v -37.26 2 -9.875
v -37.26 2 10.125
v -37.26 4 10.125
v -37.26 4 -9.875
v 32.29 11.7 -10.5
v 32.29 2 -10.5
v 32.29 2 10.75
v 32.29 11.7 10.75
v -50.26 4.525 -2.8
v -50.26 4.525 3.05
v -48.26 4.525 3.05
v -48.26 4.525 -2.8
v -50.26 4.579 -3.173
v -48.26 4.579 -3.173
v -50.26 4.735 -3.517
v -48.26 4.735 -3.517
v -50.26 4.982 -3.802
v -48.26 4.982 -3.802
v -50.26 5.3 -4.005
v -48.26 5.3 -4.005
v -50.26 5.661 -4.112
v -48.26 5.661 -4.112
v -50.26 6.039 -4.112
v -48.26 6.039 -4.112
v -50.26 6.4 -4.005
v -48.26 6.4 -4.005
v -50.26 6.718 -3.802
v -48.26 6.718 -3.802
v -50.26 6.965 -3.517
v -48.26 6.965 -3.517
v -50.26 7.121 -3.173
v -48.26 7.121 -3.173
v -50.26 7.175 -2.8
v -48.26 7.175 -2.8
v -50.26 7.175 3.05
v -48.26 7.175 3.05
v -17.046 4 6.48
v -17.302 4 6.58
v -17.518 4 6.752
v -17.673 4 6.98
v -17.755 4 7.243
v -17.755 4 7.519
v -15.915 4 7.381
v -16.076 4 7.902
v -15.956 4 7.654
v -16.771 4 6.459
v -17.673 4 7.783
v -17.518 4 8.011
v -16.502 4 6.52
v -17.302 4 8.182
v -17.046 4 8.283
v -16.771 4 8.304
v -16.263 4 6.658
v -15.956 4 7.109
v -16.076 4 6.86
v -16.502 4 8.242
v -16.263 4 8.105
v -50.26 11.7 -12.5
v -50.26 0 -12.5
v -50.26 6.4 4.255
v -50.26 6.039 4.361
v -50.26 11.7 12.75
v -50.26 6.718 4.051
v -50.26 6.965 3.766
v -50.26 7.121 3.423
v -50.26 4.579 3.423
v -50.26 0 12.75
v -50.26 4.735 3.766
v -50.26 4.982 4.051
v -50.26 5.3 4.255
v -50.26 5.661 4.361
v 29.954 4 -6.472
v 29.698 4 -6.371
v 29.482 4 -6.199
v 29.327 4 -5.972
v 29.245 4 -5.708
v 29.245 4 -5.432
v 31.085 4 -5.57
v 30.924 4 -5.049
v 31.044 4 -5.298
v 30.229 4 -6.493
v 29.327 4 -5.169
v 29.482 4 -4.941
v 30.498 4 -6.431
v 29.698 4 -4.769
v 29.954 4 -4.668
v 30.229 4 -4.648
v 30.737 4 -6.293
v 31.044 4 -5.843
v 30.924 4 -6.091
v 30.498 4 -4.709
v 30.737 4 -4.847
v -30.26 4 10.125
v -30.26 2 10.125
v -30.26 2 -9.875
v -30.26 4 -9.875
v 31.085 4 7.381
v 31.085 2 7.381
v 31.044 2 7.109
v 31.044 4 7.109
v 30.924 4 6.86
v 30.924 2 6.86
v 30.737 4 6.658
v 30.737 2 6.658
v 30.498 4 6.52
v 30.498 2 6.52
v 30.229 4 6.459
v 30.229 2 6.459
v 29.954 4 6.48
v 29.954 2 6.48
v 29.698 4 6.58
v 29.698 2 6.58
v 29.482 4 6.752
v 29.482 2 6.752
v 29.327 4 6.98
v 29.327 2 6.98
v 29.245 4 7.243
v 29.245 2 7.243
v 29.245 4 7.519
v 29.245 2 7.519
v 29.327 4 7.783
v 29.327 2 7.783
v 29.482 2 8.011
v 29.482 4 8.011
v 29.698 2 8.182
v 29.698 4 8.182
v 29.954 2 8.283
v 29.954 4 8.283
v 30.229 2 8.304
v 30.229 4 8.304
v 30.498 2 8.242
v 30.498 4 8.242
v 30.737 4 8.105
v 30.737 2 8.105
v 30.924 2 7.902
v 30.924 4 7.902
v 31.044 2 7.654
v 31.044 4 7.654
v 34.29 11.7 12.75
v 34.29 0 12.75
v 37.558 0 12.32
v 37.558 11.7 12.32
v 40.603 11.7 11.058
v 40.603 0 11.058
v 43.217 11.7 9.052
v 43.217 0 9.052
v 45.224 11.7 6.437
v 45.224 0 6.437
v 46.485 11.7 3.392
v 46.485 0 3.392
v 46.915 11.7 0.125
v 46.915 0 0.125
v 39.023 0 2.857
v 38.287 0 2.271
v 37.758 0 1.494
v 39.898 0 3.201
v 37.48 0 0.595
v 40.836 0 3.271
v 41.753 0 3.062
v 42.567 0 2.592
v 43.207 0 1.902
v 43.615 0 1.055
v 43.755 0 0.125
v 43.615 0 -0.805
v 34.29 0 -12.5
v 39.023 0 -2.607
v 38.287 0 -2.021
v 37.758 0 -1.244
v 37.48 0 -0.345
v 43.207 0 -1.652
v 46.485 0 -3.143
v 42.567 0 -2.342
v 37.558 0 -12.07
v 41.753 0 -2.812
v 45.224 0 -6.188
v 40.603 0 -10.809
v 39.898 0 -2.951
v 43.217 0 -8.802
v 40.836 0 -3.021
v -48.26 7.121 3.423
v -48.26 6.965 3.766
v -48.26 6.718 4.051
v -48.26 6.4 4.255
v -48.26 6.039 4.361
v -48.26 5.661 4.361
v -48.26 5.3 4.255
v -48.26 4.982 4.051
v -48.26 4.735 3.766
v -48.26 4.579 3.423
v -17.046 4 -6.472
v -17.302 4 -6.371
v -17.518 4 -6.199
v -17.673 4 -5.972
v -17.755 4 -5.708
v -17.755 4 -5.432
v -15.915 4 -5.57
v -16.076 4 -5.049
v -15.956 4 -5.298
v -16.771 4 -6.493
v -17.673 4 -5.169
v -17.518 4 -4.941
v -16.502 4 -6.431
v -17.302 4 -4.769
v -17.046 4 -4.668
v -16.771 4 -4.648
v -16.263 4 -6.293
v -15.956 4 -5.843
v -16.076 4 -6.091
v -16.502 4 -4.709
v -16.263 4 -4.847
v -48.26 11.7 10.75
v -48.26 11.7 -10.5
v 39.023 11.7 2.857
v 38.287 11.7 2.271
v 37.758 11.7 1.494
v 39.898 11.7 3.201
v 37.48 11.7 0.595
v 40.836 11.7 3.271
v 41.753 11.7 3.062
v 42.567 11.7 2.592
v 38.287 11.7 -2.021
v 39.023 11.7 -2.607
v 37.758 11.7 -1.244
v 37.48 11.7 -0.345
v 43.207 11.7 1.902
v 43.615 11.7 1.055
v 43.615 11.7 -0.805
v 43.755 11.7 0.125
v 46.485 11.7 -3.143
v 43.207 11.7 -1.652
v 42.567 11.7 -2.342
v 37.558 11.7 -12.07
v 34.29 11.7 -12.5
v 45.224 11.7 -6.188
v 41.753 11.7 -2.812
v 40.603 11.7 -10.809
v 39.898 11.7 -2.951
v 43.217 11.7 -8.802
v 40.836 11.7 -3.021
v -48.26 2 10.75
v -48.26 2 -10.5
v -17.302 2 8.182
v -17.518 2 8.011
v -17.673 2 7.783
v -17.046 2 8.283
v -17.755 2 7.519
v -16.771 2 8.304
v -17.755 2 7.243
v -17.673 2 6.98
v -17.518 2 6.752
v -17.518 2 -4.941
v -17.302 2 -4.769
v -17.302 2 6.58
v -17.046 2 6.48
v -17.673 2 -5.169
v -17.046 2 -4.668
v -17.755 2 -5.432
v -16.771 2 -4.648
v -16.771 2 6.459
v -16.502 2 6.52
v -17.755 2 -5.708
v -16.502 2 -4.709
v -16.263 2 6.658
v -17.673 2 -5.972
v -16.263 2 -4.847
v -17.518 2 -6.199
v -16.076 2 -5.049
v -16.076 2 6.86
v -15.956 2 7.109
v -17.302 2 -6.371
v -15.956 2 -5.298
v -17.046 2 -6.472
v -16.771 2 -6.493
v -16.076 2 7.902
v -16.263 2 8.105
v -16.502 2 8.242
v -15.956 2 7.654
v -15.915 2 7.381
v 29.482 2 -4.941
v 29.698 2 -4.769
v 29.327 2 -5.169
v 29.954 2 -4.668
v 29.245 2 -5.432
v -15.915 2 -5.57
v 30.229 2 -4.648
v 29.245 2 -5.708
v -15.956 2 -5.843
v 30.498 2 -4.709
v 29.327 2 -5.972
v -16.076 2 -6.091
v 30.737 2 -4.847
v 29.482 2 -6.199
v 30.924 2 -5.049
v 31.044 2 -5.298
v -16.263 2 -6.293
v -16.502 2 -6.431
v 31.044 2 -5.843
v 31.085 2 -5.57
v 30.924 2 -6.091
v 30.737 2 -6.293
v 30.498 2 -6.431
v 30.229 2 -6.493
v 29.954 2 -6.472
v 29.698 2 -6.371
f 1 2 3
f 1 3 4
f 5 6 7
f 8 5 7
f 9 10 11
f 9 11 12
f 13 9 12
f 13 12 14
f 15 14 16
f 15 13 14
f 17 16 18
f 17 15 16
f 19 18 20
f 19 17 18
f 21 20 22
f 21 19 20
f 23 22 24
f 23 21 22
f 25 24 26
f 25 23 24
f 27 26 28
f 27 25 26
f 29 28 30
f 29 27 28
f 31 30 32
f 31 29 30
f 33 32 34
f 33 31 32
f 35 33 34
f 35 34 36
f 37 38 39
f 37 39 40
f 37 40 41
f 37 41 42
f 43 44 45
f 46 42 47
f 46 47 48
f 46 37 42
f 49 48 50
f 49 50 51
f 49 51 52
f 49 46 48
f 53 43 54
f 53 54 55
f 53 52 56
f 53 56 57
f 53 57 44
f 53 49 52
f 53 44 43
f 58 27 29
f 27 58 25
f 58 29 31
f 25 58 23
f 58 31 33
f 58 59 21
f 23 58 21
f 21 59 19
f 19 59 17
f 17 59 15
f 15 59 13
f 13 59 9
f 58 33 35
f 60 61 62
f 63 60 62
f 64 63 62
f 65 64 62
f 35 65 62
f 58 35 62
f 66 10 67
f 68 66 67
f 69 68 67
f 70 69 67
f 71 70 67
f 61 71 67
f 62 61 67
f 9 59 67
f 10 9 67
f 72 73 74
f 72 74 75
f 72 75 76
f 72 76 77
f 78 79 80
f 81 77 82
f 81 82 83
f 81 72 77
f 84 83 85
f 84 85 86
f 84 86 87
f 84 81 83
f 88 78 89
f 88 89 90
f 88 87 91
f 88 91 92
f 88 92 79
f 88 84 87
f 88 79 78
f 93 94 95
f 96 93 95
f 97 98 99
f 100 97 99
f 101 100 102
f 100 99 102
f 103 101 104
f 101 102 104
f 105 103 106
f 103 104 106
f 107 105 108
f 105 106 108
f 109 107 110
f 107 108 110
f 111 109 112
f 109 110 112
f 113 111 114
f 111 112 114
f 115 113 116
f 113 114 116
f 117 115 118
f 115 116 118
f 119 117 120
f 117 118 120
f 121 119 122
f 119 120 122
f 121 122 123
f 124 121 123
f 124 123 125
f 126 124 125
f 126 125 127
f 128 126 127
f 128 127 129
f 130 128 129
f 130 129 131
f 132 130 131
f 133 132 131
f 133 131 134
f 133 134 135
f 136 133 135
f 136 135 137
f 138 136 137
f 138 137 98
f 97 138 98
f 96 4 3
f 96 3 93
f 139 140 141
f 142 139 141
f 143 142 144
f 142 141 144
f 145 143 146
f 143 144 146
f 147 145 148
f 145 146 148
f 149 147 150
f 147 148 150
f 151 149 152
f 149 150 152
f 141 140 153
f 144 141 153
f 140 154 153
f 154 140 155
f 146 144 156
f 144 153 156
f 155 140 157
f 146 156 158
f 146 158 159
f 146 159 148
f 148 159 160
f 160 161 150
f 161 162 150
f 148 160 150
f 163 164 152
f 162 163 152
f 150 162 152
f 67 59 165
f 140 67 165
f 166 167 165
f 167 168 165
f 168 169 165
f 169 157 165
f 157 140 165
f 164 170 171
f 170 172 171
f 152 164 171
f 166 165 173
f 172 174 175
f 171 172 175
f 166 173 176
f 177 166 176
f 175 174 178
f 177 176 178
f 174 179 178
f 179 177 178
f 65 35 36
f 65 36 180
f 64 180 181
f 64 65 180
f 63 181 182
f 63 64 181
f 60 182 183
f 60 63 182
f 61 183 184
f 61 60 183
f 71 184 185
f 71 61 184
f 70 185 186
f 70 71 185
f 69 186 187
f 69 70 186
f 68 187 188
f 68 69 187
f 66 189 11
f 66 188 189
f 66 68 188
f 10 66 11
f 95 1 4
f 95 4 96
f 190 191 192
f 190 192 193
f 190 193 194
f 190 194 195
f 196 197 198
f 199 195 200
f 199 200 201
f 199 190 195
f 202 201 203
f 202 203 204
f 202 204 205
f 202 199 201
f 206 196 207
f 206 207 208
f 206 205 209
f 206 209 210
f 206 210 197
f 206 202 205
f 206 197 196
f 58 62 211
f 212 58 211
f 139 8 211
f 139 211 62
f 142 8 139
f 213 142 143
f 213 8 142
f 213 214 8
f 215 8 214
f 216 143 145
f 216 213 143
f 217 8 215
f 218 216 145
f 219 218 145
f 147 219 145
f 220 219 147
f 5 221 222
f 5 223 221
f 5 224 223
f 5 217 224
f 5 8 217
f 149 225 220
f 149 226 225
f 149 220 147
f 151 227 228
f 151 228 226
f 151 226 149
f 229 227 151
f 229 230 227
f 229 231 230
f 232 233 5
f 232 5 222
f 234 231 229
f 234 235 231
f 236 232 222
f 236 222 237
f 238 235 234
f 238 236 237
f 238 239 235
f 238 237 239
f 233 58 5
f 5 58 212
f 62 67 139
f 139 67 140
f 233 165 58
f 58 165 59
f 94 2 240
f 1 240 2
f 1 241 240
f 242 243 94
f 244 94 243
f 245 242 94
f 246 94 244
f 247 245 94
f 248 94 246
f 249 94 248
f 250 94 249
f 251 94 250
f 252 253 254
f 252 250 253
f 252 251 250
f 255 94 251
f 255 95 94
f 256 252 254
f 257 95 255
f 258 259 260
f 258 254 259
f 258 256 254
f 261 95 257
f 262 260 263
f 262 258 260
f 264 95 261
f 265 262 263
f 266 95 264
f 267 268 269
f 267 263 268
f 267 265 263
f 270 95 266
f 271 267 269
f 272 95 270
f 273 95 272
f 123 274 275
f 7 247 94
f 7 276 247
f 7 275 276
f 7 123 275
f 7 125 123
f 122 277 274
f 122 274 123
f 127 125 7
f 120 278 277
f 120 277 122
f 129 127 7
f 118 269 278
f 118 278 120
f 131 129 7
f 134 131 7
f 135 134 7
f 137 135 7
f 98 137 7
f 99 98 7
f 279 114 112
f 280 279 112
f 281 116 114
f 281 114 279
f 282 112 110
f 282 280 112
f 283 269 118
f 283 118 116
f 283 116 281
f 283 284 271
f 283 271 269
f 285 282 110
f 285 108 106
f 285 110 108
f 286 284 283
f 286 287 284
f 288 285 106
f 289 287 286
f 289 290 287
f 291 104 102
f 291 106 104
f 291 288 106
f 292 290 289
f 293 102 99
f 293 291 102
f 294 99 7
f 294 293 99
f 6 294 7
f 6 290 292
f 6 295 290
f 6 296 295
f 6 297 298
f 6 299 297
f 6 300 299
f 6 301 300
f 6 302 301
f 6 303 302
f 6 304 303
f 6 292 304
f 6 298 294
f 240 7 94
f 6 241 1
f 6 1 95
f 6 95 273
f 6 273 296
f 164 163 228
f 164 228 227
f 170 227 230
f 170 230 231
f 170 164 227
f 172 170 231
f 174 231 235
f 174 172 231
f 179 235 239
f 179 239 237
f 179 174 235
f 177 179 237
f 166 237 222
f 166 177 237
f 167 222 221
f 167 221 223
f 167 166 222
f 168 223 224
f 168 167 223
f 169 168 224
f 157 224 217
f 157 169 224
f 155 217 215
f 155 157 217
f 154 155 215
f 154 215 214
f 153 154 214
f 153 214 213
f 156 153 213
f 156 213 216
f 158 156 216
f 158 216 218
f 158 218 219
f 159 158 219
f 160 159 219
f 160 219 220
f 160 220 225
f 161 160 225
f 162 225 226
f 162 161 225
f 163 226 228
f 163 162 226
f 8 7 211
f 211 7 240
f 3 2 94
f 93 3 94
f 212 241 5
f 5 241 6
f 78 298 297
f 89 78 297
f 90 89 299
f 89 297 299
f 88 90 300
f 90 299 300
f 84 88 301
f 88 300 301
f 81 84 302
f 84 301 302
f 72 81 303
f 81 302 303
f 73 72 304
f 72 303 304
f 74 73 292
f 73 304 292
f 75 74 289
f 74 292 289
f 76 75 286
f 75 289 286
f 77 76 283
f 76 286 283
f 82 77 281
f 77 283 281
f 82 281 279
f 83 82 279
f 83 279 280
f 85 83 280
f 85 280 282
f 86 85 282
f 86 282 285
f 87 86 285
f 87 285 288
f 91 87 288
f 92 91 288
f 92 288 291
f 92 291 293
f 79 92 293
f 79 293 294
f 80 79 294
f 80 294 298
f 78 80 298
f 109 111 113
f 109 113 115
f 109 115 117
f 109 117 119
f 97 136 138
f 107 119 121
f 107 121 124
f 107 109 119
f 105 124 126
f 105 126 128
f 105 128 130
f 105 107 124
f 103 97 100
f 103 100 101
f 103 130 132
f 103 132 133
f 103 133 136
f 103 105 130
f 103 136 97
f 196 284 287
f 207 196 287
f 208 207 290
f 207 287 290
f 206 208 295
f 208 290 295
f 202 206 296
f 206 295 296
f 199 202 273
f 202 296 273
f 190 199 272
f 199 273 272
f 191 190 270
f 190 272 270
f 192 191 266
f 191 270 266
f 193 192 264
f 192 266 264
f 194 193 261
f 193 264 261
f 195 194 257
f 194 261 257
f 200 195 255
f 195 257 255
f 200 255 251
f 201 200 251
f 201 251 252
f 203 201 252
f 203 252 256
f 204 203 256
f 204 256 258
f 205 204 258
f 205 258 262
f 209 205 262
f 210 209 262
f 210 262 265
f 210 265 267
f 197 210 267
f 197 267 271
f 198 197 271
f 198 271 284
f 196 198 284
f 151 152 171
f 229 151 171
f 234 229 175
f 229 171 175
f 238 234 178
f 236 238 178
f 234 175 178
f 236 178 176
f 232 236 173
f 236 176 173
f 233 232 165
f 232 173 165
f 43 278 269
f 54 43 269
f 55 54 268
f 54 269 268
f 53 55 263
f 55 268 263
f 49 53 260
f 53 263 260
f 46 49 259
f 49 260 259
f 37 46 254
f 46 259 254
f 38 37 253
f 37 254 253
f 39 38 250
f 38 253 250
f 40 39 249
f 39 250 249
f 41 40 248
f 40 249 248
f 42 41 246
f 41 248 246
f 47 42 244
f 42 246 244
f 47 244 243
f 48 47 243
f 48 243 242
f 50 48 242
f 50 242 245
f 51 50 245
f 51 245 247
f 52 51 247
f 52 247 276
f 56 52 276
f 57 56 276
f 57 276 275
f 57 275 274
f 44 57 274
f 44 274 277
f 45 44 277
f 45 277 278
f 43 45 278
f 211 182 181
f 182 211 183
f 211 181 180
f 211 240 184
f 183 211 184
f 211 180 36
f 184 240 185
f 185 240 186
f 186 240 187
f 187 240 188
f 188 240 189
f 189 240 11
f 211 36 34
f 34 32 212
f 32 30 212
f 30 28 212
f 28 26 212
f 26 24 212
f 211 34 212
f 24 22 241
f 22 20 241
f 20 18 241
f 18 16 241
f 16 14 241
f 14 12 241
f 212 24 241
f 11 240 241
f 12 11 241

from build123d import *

# Parameters (mm, degrees)
SKETCH1_W           = 7
SKETCH1_H           = 20
BOSS_EXTRUDE2_DEPTH = 4
SKETCH1_4_R         = 0.925
SKETCH1_4_W         = 7
SKETCH1_4_H         = 20
BOSS_EXTRUDE3_DEPTH = 2
SKETCH1_5_R         = 0.925
BOSS_EXTRUDE4_DEPTH = 4
SKETCH1_6_R         = 3.155
BOSS_EXTRUDE5_DEPTH = 11.7
CUT_EXTRUDE1_DEPTH  = 4.85


with BuildPart() as part:
    # Sketch1 → Boss-Extrude2 (new body)
    with BuildSketch(Plane(origin=(0, 0, 0), x_dir=(1, 0, 0), z_dir=(0, 1, 0))):
        with Locations((-33.759922188, -0.124838084)):
            Rectangle(SKETCH1_W, SKETCH1_H)
    extrude(amount=BOSS_EXTRUDE2_DEPTH)

    # Sketch1<4> → Boss-Extrude3 (add)
    with BuildSketch(Plane(origin=(0, 0, 0), x_dir=(1, 0, 0), z_dir=(0, 1, 0))):
        with BuildLine():
            ThreePointArc((27.470986964, -10.749838084), (21.665077812, -0.124838084), (27.470986964, 10.500161916))
            Line((27.470986964, 10.500161916), (-48.259922188, 10.500161916))
            Line((-48.259922188, 10.500161916), (-48.259922188, -10.749838084))
            Line((-48.259922188, -10.749838084), (27.470986964, -10.749838084))
        make_face()
        with Locations((-16.839922188, -7.381359305)):
            Circle(SKETCH1_4_R, mode=Mode.SUBTRACT)
        with Locations((-33.759922188, -0.124838084)):
            Rectangle(SKETCH1_4_W, SKETCH1_4_H, mode=Mode.SUBTRACT)
        with Locations((-16.839922188, 5.570161916)):
            Circle(SKETCH1_4_R, mode=Mode.SUBTRACT)
        with BuildLine():
            Line((32.290077812, 10.500161916), (27.470986964, 10.500161916))
            ThreePointArc((27.470986964, 10.500161916), (21.665077812, -0.124838084), (27.470986964, -10.749838084))
            Line((27.470986964, -10.749838084), (32.290077812, -10.749838084))
            Line((32.290077812, -10.749838084), (32.290077812, 10.500161916))
        make_face()
        with Locations((30.160077812, -7.381359305)):
            Circle(SKETCH1_4_R, mode=Mode.SUBTRACT)
        with Locations((30.160077812, 5.570161916)):
            Circle(SKETCH1_4_R, mode=Mode.SUBTRACT)
    extrude(amount=BOSS_EXTRUDE3_DEPTH)

    # Sketch1<5> → Boss-Extrude4 (add)
    with BuildSketch(Plane(origin=(0, 0, 0), x_dir=(1, 0, 0), z_dir=(0, 1, 0))):
        with Locations((-16.839922188, 5.570161916)):
            Circle(SKETCH1_5_R)
        with Locations((-16.839922188, -7.381359305)):
            Circle(SKETCH1_5_R)
        with Locations((30.160077812, -7.381359305)):
            Circle(SKETCH1_5_R)
        with Locations((30.160077812, 5.570161916)):
            Circle(SKETCH1_5_R)
    extrude(amount=BOSS_EXTRUDE4_DEPTH)

    # Sketch1<6> → Boss-Extrude5 (add)
    with BuildSketch(Plane(origin=(0, 0, 0), x_dir=(1, 0, 0), z_dir=(0, 1, 0))):
        with BuildLine():
            Line((34.290077812, 12.500161916), (-50.259922188, 12.500161916))
            Line((-50.259922188, 12.500161916), (-50.259922188, -12.749838084))
            Line((-50.259922188, -12.749838084), (34.290077812, -12.749838084))
            ThreePointArc((34.290077812, -12.749838084), (30.736910211, -12.239524419), (27.470986964, -10.749838084))
            Line((27.470986964, -10.749838084), (-48.259922188, -10.749838084))
            Line((-48.259922188, -10.749838084), (-48.259922188, 10.500161916))
            Line((-48.259922188, 10.500161916), (27.470986964, 10.500161916))
            ThreePointArc((27.470986964, 10.500161916), (30.736910211, 11.989848251), (34.290077812, 12.500161916))
        make_face()
        with BuildLine():
            Line((34.290077812, -12.749838084), (34.290077812, 12.500161916))
            ThreePointArc((34.290077812, 12.500161916), (30.736910211, 11.989848251), (27.470986964, 10.500161916))
            Line((27.470986964, 10.500161916), (32.290077812, 10.500161916))
            Line((32.290077812, 10.500161916), (32.290077812, -10.749838084))
            Line((32.290077812, -10.749838084), (27.470986964, -10.749838084))
            ThreePointArc((27.470986964, -10.749838084), (30.736910211, -12.239524419), (34.290077812, -12.749838084))
        make_face()
        with BuildLine():
            ThreePointArc((46.915077812, -0.124838084), (43.217300925, 8.802385028), (34.290077812, 12.500161916))
            Line((34.290077812, 12.500161916), (34.290077812, -12.749838084))
            ThreePointArc((34.290077812, -12.749838084), (43.217300925, -9.052061197), (46.915077812, -0.124838084))
        make_face()
        with Locations((40.600077812, -0.124838084)):
            Circle(SKETCH1_6_R, mode=Mode.SUBTRACT)
    extrude(amount=BOSS_EXTRUDE5_DEPTH)

    # Sketch3 → Cut-Extrude1 (cut, symmetric)
    with BuildSketch(Plane.ZY.offset(50.259922188)):
        with BuildLine():
            Line((-2.800161916, 7.175), (3.049838084, 7.175))
            ThreePointArc((3.049838084, 7.175), (4.374838084, 5.85), (3.049838084, 4.525))
            Line((3.049838084, 4.525), (-2.800161916, 4.525))
            ThreePointArc((-2.800161916, 4.525), (-4.125161916, 5.85), (-2.800161916, 7.175))
        make_face()
    extrude(amount=CUT_EXTRUDE1_DEPTH, both=True, mode=Mode.SUBTRACT)


solid = part.part
